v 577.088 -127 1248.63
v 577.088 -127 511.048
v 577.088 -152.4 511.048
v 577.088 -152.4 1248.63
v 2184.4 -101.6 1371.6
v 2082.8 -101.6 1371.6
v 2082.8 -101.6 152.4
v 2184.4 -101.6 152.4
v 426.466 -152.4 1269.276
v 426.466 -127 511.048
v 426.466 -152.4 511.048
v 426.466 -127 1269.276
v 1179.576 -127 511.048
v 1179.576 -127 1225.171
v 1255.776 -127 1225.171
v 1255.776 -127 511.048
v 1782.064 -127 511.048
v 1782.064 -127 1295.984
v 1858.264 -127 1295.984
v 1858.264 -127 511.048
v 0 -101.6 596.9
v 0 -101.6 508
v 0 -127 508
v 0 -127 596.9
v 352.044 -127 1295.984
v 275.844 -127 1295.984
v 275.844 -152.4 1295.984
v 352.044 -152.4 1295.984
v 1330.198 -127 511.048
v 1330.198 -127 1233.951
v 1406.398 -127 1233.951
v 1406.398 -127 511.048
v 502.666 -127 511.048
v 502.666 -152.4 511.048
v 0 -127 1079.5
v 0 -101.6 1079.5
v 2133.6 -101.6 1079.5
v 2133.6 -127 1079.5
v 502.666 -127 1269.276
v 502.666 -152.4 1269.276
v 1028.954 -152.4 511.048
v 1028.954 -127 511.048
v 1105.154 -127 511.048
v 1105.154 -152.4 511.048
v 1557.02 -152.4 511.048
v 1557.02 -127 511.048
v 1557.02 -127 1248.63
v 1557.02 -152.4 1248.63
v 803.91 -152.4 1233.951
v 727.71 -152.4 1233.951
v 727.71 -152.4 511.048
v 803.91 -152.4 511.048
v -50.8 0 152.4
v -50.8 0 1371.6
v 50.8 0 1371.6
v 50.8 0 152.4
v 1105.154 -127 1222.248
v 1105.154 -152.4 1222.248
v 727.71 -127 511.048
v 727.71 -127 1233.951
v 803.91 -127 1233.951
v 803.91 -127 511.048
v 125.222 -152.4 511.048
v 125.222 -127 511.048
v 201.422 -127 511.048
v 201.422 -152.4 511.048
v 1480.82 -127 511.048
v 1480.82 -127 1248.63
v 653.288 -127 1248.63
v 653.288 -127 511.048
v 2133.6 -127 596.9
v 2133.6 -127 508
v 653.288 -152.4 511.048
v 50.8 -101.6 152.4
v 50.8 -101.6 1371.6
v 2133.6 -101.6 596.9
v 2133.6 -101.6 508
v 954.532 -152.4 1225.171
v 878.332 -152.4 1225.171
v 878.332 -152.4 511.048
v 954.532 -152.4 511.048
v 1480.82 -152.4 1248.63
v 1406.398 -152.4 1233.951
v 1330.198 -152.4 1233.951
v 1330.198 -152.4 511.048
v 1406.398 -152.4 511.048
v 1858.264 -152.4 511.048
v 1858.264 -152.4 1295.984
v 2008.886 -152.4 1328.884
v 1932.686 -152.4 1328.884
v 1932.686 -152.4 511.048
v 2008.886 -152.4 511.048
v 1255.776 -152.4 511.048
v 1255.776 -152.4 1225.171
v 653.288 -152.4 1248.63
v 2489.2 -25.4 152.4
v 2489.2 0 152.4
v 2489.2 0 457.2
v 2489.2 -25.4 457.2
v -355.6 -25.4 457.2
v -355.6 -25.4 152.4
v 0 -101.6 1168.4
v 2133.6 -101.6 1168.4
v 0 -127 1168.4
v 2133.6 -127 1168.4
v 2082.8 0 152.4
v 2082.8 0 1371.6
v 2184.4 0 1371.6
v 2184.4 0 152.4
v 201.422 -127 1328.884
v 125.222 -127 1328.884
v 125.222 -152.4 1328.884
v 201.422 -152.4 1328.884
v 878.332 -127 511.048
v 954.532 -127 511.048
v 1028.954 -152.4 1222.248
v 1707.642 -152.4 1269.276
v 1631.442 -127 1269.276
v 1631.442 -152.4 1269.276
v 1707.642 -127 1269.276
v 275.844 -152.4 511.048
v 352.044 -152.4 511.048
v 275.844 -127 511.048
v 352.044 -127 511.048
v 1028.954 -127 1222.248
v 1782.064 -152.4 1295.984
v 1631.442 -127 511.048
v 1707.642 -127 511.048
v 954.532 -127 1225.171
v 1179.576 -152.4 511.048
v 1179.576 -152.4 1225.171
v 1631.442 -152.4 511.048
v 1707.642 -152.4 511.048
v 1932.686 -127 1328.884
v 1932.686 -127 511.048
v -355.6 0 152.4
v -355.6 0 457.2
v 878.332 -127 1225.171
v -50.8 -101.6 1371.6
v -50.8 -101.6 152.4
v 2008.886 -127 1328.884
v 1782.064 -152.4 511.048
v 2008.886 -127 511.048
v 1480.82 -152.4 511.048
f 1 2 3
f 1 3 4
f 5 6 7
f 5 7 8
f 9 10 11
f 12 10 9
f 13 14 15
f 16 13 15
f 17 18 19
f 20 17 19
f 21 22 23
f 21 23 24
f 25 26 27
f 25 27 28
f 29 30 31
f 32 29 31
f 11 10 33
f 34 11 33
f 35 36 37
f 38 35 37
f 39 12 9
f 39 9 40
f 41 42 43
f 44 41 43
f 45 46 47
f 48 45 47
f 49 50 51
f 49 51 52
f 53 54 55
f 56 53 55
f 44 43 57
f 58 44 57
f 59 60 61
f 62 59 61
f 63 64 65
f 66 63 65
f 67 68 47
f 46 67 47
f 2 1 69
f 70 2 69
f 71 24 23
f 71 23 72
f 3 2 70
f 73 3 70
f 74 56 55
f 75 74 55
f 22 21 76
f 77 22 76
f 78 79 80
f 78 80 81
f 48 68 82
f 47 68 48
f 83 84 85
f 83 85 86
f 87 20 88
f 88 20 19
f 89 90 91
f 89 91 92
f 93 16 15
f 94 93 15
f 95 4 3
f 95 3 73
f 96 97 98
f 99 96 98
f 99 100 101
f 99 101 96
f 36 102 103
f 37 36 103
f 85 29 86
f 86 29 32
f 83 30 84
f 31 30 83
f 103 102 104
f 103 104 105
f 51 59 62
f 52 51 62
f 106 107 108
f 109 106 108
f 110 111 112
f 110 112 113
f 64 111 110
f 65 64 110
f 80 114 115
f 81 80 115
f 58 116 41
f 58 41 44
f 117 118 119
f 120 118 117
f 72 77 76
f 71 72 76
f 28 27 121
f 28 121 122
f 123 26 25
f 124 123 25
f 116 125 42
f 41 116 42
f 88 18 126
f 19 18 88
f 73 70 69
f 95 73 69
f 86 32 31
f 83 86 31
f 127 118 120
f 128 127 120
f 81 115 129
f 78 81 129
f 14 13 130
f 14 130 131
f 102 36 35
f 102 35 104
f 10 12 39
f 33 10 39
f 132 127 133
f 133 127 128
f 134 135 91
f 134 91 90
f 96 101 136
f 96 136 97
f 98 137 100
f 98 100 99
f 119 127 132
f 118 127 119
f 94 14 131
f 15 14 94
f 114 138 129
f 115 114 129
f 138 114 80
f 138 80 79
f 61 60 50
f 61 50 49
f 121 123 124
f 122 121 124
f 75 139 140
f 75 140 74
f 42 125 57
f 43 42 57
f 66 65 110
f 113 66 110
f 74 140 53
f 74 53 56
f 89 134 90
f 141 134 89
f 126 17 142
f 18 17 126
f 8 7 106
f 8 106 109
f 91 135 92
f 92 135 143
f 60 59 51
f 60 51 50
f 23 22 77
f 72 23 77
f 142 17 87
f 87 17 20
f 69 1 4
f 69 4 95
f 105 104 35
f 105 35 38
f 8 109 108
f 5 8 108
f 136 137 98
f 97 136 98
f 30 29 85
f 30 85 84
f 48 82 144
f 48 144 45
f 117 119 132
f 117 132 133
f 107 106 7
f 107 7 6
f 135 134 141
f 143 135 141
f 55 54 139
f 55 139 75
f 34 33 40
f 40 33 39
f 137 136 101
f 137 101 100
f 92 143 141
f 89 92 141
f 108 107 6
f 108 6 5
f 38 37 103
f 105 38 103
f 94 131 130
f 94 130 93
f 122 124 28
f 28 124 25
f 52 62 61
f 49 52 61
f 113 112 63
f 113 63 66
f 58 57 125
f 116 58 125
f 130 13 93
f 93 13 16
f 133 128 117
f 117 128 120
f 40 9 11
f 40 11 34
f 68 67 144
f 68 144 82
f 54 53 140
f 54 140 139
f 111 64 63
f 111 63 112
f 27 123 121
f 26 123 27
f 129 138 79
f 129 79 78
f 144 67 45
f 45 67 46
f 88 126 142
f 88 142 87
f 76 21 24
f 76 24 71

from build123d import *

# Parameters (mm, degrees)
F0_W     = 101.6
F0_H     = 1371.6
F1_DEPTH = 101.6
F2_W     = 2844.8
F2_H     = 508
F3_DEPTH = 25.4
F4_W     = 2133.6
F4_H     = 88.9
F5_DEPTH = 25.4
F6_W     = 76.2
F6_H     = 817.835607
F6_H_2   = 784.935771
F6_H_3   = 758.227604
F6_H_4   = 737.582462
F6_H_5   = 722.903341
F6_H_6   = 714.122526
F7_DEPTH = 25.4
F8_W     = 4864.425036
F8_H     = 579.639387
F9_DEPTH = 101.601


with BuildPart() as f1:
    # F0 (on Front) → F1 (new body)
    with BuildSketch(Plane.XZ):
        with Locations((0, 685.8)):
            Rectangle(F0_W, F0_H)
        with Locations((2133.6, 685.8)):
            Rectangle(F0_W, F0_H)
    extrude(amount=F1_DEPTH)


with BuildPart() as f3:
    # F2 (on Front) → F3 (new body)
    with BuildSketch(Plane.XZ):
        with Locations((1066.8, 203.2)):
            Rectangle(F2_W, F2_H)
    extrude(amount=F3_DEPTH)


with BuildPart() as f5:
    # F4 (on face) → F5 (new body)
    with BuildSketch(Plane.XZ.offset(101.6)):
        with Locations((1066.8, 552.45)):
            Rectangle(F4_W, F4_H)
        with Locations((1066.8, 1123.95)):
            Rectangle(F4_W, F4_H)
    extrude(amount=F5_DEPTH)


with BuildPart() as f7:
    # F6 (on face) → F7 (new body)
    with BuildSketch(Plane.XZ.offset(127)):
        with Locations((163.322, 919.965803)):
            Rectangle(F6_W, F6_H)
        with Locations((313.944, 903.515885)):
            Rectangle(F6_W, F6_H_2)
        with Locations((464.566, 890.161802)):
            Rectangle(F6_W, F6_H_3)
        with Locations((615.188, 879.839231)):
            Rectangle(F6_W, F6_H_4)
        with Locations((765.81, 872.49967)):
            Rectangle(F6_W, F6_H_5)
        with Locations((916.432, 868.109263)):
            Rectangle(F6_W, F6_H_6)
        Polygon((1028.954, 1222.248), (1028.954, 511.048), (1105.154, 511.048), (1105.154, 1222.248), (1067.054, 1222.248), align=None)
        with Locations((1217.676, 868.109263)):
            Rectangle(F6_W, F6_H_6)
        with Locations((1368.298, 872.49967)):
            Rectangle(F6_W, F6_H_5)
        with Locations((1518.92, 879.839231)):
            Rectangle(F6_W, F6_H_4)
        with Locations((1669.542, 890.161802)):
            Rectangle(F6_W, F6_H_3)
        with Locations((1820.164, 903.515885)):
            Rectangle(F6_W, F6_H_2)
        with Locations((1970.786, 919.965803)):
            Rectangle(F6_W, F6_H)
    extrude(amount=F7_DEPTH)


with BuildPart() as f9_tool:
    # F8 (on face) → F9 (new body, through all)
    with BuildSketch(Plane.XZ.offset(101.6)):
        with Locations((1177.699417, -137.419693)):
            Rectangle(F8_W, F8_H)
    extrude(amount=-F9_DEPTH)


with BuildPart() as f1_1:
    add(f1.part)

    # F9: cut by f9_tool
    add(f9_tool.part, mode=Mode.SUBTRACT)


with BuildPart() as f3_1:
    add(f3.part)

    # F9: cut by f9_tool
    add(f9_tool.part, mode=Mode.SUBTRACT)


solid = Compound([f5.part, f7.part, f1_1.part, f3_1.part])
